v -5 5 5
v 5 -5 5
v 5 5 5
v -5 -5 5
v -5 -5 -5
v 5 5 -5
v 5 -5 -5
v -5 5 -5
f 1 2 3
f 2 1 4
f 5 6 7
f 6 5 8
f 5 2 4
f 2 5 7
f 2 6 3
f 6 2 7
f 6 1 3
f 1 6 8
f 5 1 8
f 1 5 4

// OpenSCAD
//Dimations
cube_W = 10;
cube_L = 10;
cube_H = 10;


cube(cube_W,cube_L,cube_H,center=true);
